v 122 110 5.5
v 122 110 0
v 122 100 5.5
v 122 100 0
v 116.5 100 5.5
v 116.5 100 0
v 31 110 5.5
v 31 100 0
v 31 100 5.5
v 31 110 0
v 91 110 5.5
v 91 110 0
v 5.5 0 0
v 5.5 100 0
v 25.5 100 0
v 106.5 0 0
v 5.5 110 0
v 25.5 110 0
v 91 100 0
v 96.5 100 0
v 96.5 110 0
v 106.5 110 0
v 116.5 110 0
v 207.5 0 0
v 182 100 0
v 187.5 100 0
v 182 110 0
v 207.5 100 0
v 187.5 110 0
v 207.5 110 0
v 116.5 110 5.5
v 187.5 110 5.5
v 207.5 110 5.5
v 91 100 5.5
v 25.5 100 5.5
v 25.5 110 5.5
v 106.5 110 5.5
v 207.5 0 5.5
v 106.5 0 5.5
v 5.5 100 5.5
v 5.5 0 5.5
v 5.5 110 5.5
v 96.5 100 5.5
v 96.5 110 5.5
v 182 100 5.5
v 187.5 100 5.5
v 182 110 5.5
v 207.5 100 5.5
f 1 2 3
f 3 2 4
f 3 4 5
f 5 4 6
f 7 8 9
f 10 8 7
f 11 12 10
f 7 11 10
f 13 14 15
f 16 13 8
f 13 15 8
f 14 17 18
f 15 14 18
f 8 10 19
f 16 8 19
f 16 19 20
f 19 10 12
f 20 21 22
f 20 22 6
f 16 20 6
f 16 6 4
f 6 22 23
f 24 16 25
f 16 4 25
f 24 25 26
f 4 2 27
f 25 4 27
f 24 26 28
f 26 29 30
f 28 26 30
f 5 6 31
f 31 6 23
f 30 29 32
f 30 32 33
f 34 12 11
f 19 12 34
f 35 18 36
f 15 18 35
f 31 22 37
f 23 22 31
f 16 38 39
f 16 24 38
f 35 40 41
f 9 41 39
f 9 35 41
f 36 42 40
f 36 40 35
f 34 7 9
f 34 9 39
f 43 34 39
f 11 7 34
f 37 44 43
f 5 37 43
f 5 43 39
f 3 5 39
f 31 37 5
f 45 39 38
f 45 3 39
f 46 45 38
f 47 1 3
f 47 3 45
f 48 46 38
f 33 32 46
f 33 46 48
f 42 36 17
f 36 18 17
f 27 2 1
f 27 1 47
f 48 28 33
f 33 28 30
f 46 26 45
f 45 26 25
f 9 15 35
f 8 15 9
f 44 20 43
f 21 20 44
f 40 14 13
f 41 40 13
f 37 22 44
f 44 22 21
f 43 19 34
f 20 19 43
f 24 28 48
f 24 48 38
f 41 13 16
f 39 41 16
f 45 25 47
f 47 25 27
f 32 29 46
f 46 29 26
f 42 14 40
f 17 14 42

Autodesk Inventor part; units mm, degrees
ref_plane "YZ Plane" through (0, 0, 0) normal (1, 0, 0) x (0, 1, 0)
ref_plane "XZ Plane" through (0, 0, 0) normal (0, 1, 0) x (-1, 0, 0)
ref_plane "XY Plane" through (0, 0, 0) normal (0, 0, 1) x (1, 0, 0)
sketch "Sketch2" plane through (0, 0, 0) normal (0, 0, 1) x (1, 0, 0)
  line L0 (0, 0) -> (106.5, 0)
  line L1 (106.5, 0) -> (106.5, 110) construction
  line L2 (106.5, 110) -> (0, 110)
  line L3 (0, 110) -> (0, 0)
  line L4 (213, 0) -> (106.5, 0)
  line L5 (106.5, 110) -> (213, 110)
  line L6 (213, 110) -> (213, 0)
  line L7 (5.5, 100) -> (5.5, 110)
  line L8 (5.5, 110) -> (0, 110)
  line L9 (0, 110) -> (0, 100)
  line L10 (0, 100) -> (5.5, 100)
  line L11 (5.5, 100) -> (0, 110) construction
  line L12 (5.5, 110) -> (0, 100) construction
  line L13 (213, 100) -> (207.5, 100)
  line L14 (207.5, 100) -> (207.5, 110)
  line L15 (207.5, 110) -> (213, 110)
  line L16 (207.5, 100) -> (213, 110) construction
  line L17 (207.5, 110) -> (213, 100) construction
  line L18 (213, 110) -> (213, 100)
  line L19 (106.5, 0.9442) -> (106.5, 183.5442) construction
  line L20 (31, 100) -> (31, 110)
  line L21 (25.5, 110) -> (25.5, 100)
  line L22 (25.5, 100) -> (31, 100)
  line L23 (31, 100) -> (25.5, 110) construction
  line L24 (31, 110) -> (25.5, 100) construction
  line L25 (96.5, 100) -> (96.5, 110)
  line L26 (91, 110) -> (91, 100)
  line L27 (91, 100) -> (96.5, 100)
  line L28 (96.5, 100) -> (91, 110) construction
  line L29 (96.5, 110) -> (91, 100) construction
  line L30 (122, 100) -> (116.5, 100)
  line L31 (116.5, 100) -> (116.5, 110)
  line L32 (116.5, 100) -> (122, 110) construction
  line L33 (116.5, 110) -> (122, 100) construction
  line L34 (122, 110) -> (122, 100)
  line L35 (187.5, 100) -> (182, 100)
  line L36 (182, 100) -> (182, 110)
  line L37 (182, 110) -> (187.5, 100) construction
  line L38 (182, 100) -> (187.5, 110) construction
  line L39 (187.5, 110) -> (187.5, 100)
  line L40 (28.25, 105) -> (93.75, 105) construction
  line L41 (5.5, 100) -> (5.5, 0)
  line L42 (207.5, 100) -> (207.5, 0)
  point P0 (0, 100)
  point P1 (119.25, 105)
  point P2 (184.75, 105)
  point P3 (182, 110)
  point P4 (31, 110)
  point P5 (25.5, 110)
  dimension "d18" = 106.5
  dimension "d19" = 5.5
  dimension "d30" = 10
  dimension "d33" = 100
  dimension "d38" = 10
  dimension "d47" = 20
extrude "Extrusion3" add sketch "Sketch2" along normal blind 5.5 contours L41 L7 L2 L21 L22 L20 L26 L27 L25 L5 L31 L30 L34 L36 L35 L39 L14 L42 L4 L0
equation "\"d38\" = 0.5 * d43"
equation "\"d47\" = lrbottomw"
equation "\"thick\" = 0.5"
equation "\"lrlr\" = 19"
equation "\"lrmid\" = 19.9"
equation "\"lrdepth\" = 3.3"
equation "\"mlr\" = 16.6"
equation "\"mmid\" = 24.7"
equation "\"mdepth\" = 4.5"
equation "\"lrltotal\" = 126.6"
equation "\"mltotal\" = 126.6"
equation "\"lrbetween\" = 52.1"
equation "\"mbetween\" = 49.5"
equation "\"toler\" = 1"
equation "\"lrbottomw\" = 20"
equation "\"tight\" = 0.08"
equation "\"stuckw\" = 6"
equation "\"sidewallL\" = 132.6"
equation "\"heaterH\" = 117.3"
equation "\"stickL\" = 3.5"
equation "\"wireH\" = 25"
equation "\"d43\" = 20"
properties part number "wire_bottom"
